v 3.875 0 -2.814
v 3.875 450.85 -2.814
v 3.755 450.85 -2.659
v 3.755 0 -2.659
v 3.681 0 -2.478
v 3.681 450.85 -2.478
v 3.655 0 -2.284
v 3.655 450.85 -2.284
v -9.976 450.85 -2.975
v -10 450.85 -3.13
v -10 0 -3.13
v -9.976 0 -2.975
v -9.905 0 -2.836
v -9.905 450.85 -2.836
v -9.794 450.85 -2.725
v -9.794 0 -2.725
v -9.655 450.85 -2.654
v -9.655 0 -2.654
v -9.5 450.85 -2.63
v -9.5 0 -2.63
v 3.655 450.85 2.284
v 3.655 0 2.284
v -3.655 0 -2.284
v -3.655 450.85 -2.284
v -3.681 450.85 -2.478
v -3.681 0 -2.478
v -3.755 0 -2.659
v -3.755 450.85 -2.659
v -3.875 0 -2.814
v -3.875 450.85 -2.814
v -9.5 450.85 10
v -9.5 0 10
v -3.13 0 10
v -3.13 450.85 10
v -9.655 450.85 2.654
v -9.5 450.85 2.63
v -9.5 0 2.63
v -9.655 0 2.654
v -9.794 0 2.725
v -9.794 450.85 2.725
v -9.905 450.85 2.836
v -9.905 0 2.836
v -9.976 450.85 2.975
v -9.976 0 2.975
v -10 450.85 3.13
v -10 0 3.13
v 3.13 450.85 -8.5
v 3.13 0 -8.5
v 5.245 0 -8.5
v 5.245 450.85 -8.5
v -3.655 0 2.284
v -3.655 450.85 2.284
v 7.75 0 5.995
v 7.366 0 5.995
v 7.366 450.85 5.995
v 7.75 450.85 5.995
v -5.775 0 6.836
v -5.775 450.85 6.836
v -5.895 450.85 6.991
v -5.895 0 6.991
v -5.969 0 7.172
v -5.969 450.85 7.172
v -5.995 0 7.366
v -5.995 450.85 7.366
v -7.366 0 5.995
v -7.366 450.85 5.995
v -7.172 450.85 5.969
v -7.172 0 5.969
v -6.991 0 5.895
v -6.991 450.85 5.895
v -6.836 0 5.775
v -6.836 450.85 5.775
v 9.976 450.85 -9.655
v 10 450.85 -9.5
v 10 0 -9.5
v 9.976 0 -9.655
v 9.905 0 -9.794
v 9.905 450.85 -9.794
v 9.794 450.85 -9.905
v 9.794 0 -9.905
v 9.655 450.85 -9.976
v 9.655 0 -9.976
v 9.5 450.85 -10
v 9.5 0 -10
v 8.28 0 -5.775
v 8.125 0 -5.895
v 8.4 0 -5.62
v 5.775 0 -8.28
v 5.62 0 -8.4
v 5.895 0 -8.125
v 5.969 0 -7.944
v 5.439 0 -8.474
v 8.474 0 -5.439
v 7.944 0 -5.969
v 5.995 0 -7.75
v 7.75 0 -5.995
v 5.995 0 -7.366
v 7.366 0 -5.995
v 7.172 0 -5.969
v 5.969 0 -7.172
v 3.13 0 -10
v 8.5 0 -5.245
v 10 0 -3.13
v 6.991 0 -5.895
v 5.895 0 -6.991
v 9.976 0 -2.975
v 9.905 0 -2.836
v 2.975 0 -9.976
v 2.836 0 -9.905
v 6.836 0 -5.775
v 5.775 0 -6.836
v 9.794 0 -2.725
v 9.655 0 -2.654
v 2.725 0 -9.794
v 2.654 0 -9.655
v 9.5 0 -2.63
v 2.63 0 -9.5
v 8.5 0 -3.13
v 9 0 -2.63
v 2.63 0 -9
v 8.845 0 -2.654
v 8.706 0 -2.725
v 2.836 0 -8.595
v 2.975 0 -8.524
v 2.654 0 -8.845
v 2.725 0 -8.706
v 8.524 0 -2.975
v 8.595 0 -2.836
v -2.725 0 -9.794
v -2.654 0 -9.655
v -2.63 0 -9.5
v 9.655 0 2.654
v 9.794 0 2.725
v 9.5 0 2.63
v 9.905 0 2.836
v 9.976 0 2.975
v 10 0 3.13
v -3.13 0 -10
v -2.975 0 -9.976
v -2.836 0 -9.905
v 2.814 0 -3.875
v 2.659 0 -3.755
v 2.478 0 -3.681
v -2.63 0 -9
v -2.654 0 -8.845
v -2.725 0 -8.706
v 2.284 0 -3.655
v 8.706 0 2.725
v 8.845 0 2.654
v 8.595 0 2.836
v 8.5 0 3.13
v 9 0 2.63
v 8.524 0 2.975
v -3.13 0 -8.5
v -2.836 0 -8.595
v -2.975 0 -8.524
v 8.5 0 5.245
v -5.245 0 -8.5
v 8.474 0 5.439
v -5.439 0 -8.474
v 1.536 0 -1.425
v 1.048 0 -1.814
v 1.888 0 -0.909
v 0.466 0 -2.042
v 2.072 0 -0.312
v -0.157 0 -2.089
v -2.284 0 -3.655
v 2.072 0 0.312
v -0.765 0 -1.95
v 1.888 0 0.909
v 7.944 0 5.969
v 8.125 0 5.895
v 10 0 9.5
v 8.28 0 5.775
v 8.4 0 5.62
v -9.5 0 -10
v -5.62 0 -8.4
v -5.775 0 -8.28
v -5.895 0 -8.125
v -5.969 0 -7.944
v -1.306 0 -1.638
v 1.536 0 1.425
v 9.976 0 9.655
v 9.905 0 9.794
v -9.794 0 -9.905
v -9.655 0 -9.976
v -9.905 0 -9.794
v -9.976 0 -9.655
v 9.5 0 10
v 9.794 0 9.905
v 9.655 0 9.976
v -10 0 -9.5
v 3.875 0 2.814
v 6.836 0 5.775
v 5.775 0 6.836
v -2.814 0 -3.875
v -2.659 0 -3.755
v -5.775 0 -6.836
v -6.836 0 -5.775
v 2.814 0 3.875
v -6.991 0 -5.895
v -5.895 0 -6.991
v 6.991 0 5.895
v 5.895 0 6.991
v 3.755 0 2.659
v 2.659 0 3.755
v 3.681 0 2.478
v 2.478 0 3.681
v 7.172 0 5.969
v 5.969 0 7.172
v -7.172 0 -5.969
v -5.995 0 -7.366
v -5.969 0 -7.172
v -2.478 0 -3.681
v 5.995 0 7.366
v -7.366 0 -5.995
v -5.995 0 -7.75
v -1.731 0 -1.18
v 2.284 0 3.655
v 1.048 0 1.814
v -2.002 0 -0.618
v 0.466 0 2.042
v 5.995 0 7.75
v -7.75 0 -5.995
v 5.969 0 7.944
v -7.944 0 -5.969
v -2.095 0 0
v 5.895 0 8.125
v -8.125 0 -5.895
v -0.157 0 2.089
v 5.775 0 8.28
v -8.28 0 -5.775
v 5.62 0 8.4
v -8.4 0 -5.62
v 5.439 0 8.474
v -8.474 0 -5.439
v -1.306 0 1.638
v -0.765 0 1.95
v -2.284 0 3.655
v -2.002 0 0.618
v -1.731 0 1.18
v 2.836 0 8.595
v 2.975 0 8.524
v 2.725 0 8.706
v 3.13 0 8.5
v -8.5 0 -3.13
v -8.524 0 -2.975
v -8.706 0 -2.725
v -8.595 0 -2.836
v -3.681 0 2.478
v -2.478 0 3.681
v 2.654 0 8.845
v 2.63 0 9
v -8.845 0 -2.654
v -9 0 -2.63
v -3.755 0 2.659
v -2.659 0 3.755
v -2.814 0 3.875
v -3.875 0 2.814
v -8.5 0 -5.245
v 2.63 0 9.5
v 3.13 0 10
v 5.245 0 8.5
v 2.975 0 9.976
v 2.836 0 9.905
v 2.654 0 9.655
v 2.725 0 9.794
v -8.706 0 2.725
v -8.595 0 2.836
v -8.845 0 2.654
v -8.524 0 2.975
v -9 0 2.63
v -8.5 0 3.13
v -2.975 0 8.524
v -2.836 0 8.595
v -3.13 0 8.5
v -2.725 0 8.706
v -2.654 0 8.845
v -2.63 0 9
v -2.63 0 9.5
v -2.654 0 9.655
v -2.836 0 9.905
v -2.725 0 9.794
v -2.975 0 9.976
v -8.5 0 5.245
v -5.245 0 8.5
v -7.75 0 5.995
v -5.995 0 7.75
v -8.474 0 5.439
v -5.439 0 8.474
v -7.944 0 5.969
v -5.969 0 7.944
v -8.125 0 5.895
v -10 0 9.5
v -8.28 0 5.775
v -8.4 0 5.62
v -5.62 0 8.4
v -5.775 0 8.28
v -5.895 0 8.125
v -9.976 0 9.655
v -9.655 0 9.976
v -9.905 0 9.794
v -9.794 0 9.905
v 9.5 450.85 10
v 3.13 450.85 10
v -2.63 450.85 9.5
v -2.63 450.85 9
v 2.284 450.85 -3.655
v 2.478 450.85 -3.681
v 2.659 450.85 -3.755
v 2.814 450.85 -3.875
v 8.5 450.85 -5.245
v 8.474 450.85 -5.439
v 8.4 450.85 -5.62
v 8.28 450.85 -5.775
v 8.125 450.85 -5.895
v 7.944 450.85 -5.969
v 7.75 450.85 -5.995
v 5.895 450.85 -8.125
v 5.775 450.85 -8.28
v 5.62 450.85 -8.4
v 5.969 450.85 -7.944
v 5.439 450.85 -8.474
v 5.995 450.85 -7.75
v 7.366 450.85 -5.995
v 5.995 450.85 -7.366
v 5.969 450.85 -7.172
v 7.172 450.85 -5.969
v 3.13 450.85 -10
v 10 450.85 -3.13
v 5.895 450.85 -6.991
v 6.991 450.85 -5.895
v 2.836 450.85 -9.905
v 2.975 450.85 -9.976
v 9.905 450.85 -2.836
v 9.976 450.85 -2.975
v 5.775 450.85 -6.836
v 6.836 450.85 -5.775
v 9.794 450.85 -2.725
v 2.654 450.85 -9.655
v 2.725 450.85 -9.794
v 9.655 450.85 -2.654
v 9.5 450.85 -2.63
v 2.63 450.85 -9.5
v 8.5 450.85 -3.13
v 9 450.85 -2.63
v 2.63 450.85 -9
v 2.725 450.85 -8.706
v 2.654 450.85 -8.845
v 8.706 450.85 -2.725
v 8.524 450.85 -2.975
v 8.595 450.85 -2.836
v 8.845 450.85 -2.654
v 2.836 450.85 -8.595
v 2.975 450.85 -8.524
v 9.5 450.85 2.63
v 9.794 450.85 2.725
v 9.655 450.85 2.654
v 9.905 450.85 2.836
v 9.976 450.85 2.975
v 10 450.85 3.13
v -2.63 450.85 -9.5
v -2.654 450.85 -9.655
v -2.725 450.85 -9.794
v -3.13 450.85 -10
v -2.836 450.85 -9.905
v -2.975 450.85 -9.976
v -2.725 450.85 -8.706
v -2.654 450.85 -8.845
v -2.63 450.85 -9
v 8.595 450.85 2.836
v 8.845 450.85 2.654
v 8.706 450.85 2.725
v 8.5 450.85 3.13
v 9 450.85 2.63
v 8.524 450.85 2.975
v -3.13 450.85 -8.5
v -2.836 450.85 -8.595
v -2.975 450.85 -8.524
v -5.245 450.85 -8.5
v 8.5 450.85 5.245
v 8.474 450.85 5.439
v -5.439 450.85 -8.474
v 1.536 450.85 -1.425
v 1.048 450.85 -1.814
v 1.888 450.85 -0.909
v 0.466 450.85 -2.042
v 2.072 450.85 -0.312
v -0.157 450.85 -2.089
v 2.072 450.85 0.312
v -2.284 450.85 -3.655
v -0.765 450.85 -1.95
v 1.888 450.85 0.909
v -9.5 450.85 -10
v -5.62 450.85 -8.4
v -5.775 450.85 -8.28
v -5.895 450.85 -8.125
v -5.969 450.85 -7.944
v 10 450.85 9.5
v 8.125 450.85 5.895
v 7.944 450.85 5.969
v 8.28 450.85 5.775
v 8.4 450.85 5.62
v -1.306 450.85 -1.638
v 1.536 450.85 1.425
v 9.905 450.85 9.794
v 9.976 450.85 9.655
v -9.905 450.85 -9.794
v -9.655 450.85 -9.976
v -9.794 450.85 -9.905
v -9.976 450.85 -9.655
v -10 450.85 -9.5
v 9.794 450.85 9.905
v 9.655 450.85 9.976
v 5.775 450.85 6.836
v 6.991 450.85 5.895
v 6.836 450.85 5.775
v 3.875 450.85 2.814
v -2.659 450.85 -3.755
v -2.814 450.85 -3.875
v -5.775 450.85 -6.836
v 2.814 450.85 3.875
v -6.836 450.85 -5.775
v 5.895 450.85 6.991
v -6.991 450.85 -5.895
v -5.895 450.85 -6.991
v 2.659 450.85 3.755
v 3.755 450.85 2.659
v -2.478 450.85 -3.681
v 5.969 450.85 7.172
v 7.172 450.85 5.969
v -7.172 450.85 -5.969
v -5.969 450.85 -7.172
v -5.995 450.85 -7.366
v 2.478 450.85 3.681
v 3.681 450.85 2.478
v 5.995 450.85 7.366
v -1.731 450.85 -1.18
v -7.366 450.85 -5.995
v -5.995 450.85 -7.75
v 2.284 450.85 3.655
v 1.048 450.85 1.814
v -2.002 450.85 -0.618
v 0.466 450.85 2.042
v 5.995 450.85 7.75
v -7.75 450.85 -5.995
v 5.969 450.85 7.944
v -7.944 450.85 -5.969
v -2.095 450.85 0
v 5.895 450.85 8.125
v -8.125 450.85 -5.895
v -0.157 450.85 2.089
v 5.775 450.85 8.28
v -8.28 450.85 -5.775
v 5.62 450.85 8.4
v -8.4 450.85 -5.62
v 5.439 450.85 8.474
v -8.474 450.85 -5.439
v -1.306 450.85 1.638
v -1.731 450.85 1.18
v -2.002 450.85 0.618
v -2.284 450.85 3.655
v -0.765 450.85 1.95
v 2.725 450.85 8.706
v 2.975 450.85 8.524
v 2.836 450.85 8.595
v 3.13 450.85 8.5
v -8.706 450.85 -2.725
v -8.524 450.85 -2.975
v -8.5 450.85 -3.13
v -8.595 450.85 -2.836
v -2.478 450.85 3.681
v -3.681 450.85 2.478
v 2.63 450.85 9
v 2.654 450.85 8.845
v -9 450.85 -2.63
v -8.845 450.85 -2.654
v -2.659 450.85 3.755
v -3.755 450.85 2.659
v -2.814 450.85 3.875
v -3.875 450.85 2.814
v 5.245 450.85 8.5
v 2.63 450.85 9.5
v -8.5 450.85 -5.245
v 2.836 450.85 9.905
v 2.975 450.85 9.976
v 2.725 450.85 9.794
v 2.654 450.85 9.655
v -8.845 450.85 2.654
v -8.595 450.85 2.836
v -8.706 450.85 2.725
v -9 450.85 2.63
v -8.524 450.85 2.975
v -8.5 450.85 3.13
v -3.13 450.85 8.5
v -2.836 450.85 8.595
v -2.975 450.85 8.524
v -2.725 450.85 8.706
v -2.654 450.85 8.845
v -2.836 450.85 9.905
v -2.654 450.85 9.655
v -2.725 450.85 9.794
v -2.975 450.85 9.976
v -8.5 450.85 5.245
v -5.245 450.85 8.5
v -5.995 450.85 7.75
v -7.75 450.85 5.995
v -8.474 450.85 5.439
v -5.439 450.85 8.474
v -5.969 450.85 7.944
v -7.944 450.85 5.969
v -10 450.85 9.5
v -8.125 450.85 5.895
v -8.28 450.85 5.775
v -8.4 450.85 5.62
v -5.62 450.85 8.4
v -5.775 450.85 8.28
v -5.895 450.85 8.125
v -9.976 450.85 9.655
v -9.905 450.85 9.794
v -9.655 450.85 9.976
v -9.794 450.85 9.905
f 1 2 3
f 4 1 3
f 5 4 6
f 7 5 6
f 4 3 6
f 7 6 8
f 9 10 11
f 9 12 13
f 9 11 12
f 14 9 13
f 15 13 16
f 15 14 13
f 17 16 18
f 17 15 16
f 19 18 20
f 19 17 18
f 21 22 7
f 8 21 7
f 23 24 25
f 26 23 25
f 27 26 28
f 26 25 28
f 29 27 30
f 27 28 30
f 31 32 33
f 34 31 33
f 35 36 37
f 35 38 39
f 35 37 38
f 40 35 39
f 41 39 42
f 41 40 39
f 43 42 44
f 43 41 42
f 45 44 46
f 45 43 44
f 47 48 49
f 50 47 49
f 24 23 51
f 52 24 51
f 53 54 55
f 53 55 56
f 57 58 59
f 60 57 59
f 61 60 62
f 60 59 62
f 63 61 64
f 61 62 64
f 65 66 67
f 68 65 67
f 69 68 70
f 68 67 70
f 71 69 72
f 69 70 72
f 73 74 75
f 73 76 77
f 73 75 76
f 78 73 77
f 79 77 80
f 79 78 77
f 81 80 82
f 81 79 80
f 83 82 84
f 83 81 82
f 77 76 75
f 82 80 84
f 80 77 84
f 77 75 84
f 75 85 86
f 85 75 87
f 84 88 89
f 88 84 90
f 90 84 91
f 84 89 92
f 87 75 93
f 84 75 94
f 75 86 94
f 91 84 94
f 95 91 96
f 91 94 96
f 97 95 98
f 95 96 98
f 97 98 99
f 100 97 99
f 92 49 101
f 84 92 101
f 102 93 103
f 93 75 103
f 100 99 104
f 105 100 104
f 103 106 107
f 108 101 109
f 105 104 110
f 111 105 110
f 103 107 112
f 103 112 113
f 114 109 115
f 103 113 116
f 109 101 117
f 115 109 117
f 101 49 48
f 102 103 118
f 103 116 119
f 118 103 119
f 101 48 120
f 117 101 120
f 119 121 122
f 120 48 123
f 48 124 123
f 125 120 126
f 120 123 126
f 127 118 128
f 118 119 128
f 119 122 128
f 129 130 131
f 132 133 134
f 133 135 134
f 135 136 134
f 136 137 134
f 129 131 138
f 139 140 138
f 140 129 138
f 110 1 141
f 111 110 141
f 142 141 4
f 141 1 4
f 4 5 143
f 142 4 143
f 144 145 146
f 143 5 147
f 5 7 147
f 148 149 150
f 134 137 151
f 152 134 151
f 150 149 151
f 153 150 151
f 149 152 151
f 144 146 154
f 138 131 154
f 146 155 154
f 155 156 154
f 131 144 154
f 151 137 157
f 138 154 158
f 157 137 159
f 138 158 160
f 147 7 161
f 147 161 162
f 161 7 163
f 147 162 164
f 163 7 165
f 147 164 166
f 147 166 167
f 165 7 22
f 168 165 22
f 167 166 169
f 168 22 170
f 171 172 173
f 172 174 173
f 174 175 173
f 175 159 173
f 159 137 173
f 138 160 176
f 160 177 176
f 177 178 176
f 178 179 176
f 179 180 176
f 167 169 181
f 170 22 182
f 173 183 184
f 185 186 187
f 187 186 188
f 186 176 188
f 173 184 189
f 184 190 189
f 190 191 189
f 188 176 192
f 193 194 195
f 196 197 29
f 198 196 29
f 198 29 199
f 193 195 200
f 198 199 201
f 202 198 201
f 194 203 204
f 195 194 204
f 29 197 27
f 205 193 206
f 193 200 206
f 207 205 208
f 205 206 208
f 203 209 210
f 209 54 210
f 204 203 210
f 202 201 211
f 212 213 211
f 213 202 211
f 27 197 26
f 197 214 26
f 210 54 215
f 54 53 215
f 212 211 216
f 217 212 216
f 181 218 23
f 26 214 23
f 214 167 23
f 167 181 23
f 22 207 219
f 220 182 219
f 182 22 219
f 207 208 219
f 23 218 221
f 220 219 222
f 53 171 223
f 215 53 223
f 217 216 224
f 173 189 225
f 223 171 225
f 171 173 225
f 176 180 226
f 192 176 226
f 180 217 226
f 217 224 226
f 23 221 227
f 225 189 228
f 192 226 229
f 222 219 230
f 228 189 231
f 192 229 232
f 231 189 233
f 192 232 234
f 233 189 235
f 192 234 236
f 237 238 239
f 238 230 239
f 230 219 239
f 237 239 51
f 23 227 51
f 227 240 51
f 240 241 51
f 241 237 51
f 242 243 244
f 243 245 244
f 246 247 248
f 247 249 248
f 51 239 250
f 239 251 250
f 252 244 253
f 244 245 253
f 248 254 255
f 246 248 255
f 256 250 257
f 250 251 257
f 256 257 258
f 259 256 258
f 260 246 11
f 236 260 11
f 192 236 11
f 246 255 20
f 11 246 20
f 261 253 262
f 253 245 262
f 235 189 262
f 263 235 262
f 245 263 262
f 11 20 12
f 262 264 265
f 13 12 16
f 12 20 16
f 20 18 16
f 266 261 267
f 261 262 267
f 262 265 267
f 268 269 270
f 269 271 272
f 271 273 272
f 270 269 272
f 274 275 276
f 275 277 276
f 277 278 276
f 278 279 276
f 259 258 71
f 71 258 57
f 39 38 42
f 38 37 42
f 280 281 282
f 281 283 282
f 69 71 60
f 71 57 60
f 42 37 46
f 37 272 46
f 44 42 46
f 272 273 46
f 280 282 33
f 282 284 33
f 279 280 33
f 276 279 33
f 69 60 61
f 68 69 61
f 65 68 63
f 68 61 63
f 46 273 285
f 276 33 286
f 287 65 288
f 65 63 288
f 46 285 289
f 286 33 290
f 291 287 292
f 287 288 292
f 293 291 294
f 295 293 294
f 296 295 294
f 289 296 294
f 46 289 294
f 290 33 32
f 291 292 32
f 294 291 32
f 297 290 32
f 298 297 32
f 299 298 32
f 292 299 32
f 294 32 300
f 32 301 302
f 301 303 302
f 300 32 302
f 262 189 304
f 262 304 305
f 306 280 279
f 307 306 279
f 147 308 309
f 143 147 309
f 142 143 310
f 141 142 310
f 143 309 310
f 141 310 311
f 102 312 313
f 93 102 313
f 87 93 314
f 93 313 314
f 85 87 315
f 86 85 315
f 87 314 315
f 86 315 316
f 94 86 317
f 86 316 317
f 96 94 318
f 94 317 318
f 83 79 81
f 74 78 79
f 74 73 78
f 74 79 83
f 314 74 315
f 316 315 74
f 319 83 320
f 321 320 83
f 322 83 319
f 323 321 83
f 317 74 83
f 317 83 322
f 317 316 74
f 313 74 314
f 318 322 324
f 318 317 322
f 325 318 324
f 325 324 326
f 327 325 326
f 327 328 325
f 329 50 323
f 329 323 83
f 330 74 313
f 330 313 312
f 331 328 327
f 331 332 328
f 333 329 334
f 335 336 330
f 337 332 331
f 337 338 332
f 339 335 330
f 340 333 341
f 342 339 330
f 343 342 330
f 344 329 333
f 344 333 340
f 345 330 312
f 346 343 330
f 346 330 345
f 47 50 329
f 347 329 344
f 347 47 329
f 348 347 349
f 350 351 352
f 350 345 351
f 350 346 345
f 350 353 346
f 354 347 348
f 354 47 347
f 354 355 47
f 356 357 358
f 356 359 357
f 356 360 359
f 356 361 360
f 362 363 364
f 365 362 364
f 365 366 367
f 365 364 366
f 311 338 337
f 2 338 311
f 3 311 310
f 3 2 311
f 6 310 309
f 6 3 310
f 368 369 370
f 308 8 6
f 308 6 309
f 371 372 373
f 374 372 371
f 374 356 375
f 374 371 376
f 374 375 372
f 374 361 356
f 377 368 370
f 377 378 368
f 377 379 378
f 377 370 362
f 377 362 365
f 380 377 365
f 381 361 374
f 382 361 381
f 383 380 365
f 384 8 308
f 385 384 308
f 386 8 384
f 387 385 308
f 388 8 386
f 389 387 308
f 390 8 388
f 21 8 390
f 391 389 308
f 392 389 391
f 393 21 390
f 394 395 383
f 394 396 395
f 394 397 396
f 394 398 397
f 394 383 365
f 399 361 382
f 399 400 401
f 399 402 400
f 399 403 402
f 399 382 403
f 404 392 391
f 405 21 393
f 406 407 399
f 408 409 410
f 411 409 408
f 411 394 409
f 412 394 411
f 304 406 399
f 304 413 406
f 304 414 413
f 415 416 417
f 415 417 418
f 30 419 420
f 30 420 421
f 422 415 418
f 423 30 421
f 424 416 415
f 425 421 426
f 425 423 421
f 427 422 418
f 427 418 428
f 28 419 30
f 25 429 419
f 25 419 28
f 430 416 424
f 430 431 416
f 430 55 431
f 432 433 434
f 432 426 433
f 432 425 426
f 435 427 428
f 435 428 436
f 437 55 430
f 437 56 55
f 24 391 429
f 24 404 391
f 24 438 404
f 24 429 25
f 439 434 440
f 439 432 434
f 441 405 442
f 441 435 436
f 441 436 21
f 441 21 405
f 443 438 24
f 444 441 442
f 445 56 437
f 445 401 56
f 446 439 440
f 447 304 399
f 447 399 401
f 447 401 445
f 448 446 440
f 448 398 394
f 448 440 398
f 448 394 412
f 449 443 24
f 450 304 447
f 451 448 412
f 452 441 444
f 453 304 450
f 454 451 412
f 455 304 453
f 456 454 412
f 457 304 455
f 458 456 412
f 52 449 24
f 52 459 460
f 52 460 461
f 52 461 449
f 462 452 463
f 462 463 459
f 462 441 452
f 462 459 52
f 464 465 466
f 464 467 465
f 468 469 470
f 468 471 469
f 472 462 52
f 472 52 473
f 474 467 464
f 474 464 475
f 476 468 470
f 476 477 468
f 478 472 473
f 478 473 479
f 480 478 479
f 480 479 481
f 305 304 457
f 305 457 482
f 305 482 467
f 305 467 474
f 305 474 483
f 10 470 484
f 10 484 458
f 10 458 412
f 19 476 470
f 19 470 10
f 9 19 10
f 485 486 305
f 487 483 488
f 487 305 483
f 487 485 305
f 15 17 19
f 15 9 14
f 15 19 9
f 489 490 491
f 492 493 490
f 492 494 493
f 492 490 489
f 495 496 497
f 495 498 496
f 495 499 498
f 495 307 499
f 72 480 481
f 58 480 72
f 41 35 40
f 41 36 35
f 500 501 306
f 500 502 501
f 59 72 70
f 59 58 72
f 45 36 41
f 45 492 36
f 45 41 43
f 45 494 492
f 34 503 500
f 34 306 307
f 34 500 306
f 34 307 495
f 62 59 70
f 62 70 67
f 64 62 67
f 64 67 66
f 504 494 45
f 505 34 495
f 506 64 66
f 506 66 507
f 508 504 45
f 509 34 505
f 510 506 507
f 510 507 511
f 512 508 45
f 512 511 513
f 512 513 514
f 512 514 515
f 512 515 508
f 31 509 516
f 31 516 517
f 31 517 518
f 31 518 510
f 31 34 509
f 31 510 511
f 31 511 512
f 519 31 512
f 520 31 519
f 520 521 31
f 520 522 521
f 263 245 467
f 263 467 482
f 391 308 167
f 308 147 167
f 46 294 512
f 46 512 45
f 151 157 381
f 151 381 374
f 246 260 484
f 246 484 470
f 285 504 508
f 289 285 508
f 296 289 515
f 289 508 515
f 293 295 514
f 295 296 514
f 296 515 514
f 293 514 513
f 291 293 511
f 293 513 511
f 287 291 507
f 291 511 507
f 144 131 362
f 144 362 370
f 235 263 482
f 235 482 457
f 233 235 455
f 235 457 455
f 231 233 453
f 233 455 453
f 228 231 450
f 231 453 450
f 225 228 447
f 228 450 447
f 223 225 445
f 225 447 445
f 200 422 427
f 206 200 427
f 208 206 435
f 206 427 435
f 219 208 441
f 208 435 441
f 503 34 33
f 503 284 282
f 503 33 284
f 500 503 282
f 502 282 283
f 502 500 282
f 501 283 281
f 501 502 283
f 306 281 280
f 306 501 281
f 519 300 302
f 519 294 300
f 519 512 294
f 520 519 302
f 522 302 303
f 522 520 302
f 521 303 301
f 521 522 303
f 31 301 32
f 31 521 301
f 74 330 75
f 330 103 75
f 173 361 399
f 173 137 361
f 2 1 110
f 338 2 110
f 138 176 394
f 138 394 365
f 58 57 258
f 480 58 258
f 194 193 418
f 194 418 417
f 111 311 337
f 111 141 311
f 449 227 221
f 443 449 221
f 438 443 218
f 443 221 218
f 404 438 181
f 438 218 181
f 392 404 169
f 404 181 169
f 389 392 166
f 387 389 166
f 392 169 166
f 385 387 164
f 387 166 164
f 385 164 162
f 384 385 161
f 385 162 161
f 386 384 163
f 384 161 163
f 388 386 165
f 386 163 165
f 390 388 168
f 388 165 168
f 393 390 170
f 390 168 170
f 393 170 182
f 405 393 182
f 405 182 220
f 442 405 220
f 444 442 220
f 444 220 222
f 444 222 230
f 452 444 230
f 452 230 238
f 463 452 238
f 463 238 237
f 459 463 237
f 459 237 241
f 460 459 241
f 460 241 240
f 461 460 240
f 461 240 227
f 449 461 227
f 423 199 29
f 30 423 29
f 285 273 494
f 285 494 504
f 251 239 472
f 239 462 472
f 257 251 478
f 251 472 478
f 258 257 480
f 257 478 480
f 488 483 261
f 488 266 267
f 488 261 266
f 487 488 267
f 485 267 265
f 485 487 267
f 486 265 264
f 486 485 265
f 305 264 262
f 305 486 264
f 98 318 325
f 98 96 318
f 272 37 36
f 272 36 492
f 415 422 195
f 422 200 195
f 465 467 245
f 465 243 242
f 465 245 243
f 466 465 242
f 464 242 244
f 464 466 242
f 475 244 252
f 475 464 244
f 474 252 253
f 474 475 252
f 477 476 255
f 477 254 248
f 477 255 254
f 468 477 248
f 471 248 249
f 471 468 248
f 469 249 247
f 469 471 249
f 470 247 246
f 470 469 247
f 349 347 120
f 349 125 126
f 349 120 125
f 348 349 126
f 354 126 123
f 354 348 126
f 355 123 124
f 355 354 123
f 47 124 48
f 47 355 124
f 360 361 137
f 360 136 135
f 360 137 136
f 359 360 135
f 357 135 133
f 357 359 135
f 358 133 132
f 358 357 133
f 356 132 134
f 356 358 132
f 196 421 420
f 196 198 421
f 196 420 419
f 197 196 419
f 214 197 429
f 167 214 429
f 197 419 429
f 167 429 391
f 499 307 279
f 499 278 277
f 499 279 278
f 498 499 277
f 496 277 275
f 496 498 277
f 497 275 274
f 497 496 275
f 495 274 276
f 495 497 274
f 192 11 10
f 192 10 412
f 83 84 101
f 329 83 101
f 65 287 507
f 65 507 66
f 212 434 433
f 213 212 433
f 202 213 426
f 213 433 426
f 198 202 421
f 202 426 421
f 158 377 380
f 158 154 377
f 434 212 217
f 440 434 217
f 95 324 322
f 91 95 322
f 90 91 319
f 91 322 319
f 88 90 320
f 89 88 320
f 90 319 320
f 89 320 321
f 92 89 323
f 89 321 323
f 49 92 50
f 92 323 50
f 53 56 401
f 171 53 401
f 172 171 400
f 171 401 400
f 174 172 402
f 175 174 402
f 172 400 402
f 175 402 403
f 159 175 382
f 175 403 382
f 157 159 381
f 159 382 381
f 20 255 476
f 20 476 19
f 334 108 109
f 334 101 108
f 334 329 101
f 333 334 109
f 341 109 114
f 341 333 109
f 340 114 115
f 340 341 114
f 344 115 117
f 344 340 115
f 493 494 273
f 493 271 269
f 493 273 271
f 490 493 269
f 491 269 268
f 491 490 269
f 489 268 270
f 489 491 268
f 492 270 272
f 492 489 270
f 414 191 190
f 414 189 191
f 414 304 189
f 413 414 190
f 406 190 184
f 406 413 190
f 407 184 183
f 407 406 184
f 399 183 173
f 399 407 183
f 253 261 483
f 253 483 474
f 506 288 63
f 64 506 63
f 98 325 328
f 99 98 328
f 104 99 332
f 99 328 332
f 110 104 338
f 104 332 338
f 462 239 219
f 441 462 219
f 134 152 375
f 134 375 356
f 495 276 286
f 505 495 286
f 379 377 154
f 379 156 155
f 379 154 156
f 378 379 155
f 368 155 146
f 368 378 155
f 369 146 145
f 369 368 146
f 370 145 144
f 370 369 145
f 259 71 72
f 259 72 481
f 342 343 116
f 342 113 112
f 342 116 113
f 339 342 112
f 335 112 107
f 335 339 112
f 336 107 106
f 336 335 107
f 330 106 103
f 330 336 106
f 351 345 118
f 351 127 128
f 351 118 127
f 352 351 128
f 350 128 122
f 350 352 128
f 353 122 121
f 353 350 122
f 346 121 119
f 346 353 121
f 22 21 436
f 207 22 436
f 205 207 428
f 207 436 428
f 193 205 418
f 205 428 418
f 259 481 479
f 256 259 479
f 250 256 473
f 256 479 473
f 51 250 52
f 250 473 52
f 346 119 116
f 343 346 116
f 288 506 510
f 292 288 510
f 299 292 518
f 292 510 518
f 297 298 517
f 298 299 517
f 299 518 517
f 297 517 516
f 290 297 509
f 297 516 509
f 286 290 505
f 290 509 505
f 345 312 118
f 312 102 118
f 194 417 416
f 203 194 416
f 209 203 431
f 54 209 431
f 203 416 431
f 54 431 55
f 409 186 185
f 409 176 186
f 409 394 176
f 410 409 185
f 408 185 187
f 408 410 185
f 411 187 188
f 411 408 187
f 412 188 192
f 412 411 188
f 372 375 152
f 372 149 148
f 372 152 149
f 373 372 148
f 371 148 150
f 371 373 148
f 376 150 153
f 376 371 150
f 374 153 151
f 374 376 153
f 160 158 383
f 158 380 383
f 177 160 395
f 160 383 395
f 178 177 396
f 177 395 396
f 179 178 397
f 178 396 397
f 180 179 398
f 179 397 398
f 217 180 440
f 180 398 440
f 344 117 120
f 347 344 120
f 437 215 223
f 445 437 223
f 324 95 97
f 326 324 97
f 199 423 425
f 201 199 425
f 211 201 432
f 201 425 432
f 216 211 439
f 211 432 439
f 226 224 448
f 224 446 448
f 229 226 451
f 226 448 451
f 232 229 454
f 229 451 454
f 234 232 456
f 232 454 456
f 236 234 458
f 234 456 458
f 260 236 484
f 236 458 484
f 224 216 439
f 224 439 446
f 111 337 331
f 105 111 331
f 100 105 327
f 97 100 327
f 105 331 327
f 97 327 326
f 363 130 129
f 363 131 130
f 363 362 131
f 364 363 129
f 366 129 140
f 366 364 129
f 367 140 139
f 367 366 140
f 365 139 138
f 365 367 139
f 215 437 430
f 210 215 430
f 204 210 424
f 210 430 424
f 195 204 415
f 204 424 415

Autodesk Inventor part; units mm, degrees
ref_plane "YZ Plane" through (0, 0, 0) normal (1, 0, 0) x (0, 1, 0)
ref_plane "XZ Plane" through (0, 0, 0) normal (0, 1, 0) x (-1, 0, 0)
ref_plane "XY Plane" through (0, 0, 0) normal (0, 0, 1) x (1, 0, 0)
sketch "Sketch1" plane through (0, 0, 0) normal (0, 1, 0) x (-1, 0, 0)
  line L0 (0, -14) -> (0, 14) projected
  line L1 (-14, 0) -> (14, 0) projected
  line L2 (14, 0) -> (-14, 0) projected
  line L3 (0, -14) -> (0, 14) projected
  line L4 (2.5943, 3.655) -> (-2.5943, 3.655)
  line L5 (-3.655, 2.5943) -> (-3.655, -2.5943)
  line L6 (-2.5943, -3.655) -> (2.5943, -3.655)
  line L7 (3.655, -2.5943) -> (3.655, 2.5943)
  line L8 (-3.655, 3.655) -> (3.655, -3.655) construction
  line L9 (10, 10) -> (10, 2.63)
  line L10 (10, 2.63) -> (8.5, 2.63)
  line L11 (10, 10) -> (2.63, 10)
  line L12 (2.63, 10) -> (2.63, 8.5)
  line L13 (-10, 10) -> (-2.63, 10)
  line L14 (-2.63, 10) -> (-2.63, 8.5)
  line L15 (-10, 8.5) -> (-10, 10)
  line L16 (-10, 10) -> (-8.5, 10)
  line L17 (-8.5, 2.63) -> (-10, 2.63)
  line L18 (-10, 2.63) -> (-10, 10)
  line L19 (-10, -10) -> (-8.5, -10)
  line L20 (-8.5, -2.63) -> (-10, -2.63)
  line L21 (-10, -2.63) -> (-10, -10)
  line L22 (-10, -10) -> (-2.63, -10)
  line L23 (-2.63, -10) -> (-2.63, -8.5)
  line L24 (-10, -8.5) -> (-10, -10)
  line L25 (10, -10) -> (8.5, -10)
  line L26 (8.5, -2.63) -> (10, -2.63)
  line L27 (10, -2.63) -> (10, -10)
  line L28 (10, -10) -> (2.63, -10)
  line L29 (2.63, -10) -> (2.63, -8.5)
  line L30 (10, -8.5) -> (10, -10)
  circle A0 centre (0, 0) radius 2.095
  line L31 (5.995, -10) -> (2.63, -10)
  line L32 (-2.63, -10) -> (-5.995, -10)
  line L33 (10, -10) -> (2.63, -10)
  line L34 (-2.63, -10) -> (-10, -10)
  line L35 (10, -5.995) -> (10, -2.63)
  line L36 (10, 2.63) -> (10, 5.995)
  line L37 (10, 10) -> (10, 2.63)
  line L38 (10, -2.63) -> (10, -10)
  line L39 (-5.995, 10) -> (-2.63, 10)
  line L40 (2.63, 10) -> (5.995, 10)
  line L41 (-10, 10) -> (-2.63, 10)
  line L42 (2.63, 10) -> (10, 10)
  line L43 (-10, 5.995) -> (-10, 2.63)
  line L44 (-10, -2.63) -> (-10, -5.995)
  line L45 (-10, -10) -> (-10, -2.63)
  line L46 (-10, 2.63) -> (-10, 10)
  line L47 (-2.63, -8.5) -> (-5.995, -8.5)
  line L48 (-8.5, -5.995) -> (-8.5, -2.63)
  line L49 (-8.5, -5.995) -> (-7.0557, -5.995)
  line L50 (-5.995, -8.5) -> (-5.995, -7.0557)
  line L51 (-5.995, 7.0557) -> (-5.995, 8.5)
  line L52 (2.63, 8.5) -> (5.995, 8.5)
  line L53 (8.5, 2.63) -> (8.5, 5.995)
  line L54 (8.5, 5.995) -> (7.0557, 5.995)
  line L55 (5.995, 8.5) -> (5.995, 7.0557)
  line L56 (2.63, -8.5) -> (5.995, -8.5)
  line L57 (9.5607, -8.5) -> (10, -8.5)
  line L58 (8.5, -10) -> (8.5, -9.5607)
  line L59 (8.5, -5.995) -> (8.5, -2.63)
  line L60 (7.0557, -5.995) -> (8.5, -5.995)
  line L61 (5.995, -7.0557) -> (5.995, -8.5)
  line L62 (3.655, 3.655) -> (-0.5303, -0.5303) construction
  line L63 (-1.4814, -1.4814) -> (-3.655, -3.655) construction
  line L64 (-8.5, 10) -> (-8.5, 9.5607)
  line L65 (-8.5, 5.995) -> (-8.5, 2.63)
  line L66 (-2.63, 8.5) -> (-5.995, 8.5)
  line L67 (-9.5607, 8.5) -> (-10, 8.5)
  line L68 (-7.0557, 5.995) -> (-8.5, 5.995)
  line L69 (-3.655, 2.5943) -> (-7.0557, 5.995)
  line L70 (-2.5943, 3.655) -> (-5.995, 7.0557)
  line L71 (5.995, 7.0557) -> (2.5943, 3.655)
  line L72 (7.0557, 5.995) -> (3.655, 2.5943)
  line L73 (7.0557, -5.995) -> (3.655, -2.5943)
  line L74 (5.995, -7.0557) -> (2.5943, -3.655)
  line L75 (-2.5943, -3.655) -> (-5.995, -7.0557)
  line L76 (-3.655, -2.5943) -> (-7.0557, -5.995)
  dimension "d26" = 4.19
  dimension "d0" = 20
  dimension "d1" = 20
  dimension "d2" = 7.31
  dimension "d3" = 7.31
  dimension "d4" = 20
  dimension "d5" = 11.99
  dimension "d6" = 11.99
  dimension "d11" = 7.37
  dimension "d12" = 1.5
  dimension "d13" = 7.37
  dimension "d14" = 1.5
  dimension "d15" = 7.37
  dimension "d16" = 1.5
  dimension "d17" = 7.37
  dimension "d18" = 1.5
  dimension "d19" = 7.37
  dimension "d20" = 7.37
  dimension "d21" = 1.5
  dimension "d22" = 1.5
  dimension "d23" = 7.37
  dimension "d24" = 7.37
  dimension "d25" = 1.5
extrude "Extrusion1" add sketch "Sketch1" along normal blind 450.85 contours L6 L75 L50 L47 L23 L22 L19 L21 L20 L48 L49 L76 L5 L1 A0 L0 | L0 A0 L1 L7 L73 L60 L59 L26 L27 L25 L28 L29 L56 L61 L74 L6 | L1 L5 L69 L68 L65 L17 L18 L15 L13 L14 L66 L51 L70 L4 L0 A0 | A0 L0 L4 L71 L55 L52 L12 L11 L9 L10 L53 L54 L72 L7 L1
fillet "Fillet1" radius 0.5 20 edges at (10, 225.425, 10) (2.63, 225.425, 10) (-2.63, 225.425, 10) (-2.63, 225.425, 8.5) (10, 225.425, 2.63) (8.5, 225.425, 2.63) (10, 225.425, -2.63) (8.5, 225.425, -2.63) (10, 225.425, -10) (2.63, 225.425, -8.5) (-2.63, 225.425, -10) (-2.63, 225.425, -8.5) (2.63, 225.425, -10) (-10, 225.425, -10) (-8.5, 225.425, -2.63) (-10, 225.425, -2.63) (-8.5, 225.425, 2.63) (-10, 225.425, 2.63) (-10, 225.425, 10) (2.63, 225.425, 8.5)
fillet "Fillet2" radius 0.75 24 edges at (-7.0557, 225.425, 5.995) (-3.655, 225.425, 2.5943) (-8.5, 225.425, -5.995) (-7.0557, 225.425, -5.995) (-5.995, 225.425, -8.5) (3.655, 225.425, -2.5943) (7.0557, 225.425, -5.995) (-2.5943, 225.425, 3.655) (-5.995, 225.425, 7.0557) (3.655, 225.425, 2.5943) (7.0557, 225.425, 5.995) (8.5, 225.425, 5.995) (8.5, 225.425, -5.995) (2.5943, 225.425, 3.655) (5.995, 225.425, 7.0557) (5.995, 225.425, 8.5) (-5.995, 225.425, 8.5) (-8.5, 225.425, 5.995) (2.5943, 225.425, -3.655) (5.995, 225.425, -7.0557) (5.995, 225.425, -8.5) (-5.995, 225.425, -7.0557) (-2.5943, 225.425, -3.655) (-3.655, 225.425, -2.5943)
properties part number "Profile_Len_860mm"
